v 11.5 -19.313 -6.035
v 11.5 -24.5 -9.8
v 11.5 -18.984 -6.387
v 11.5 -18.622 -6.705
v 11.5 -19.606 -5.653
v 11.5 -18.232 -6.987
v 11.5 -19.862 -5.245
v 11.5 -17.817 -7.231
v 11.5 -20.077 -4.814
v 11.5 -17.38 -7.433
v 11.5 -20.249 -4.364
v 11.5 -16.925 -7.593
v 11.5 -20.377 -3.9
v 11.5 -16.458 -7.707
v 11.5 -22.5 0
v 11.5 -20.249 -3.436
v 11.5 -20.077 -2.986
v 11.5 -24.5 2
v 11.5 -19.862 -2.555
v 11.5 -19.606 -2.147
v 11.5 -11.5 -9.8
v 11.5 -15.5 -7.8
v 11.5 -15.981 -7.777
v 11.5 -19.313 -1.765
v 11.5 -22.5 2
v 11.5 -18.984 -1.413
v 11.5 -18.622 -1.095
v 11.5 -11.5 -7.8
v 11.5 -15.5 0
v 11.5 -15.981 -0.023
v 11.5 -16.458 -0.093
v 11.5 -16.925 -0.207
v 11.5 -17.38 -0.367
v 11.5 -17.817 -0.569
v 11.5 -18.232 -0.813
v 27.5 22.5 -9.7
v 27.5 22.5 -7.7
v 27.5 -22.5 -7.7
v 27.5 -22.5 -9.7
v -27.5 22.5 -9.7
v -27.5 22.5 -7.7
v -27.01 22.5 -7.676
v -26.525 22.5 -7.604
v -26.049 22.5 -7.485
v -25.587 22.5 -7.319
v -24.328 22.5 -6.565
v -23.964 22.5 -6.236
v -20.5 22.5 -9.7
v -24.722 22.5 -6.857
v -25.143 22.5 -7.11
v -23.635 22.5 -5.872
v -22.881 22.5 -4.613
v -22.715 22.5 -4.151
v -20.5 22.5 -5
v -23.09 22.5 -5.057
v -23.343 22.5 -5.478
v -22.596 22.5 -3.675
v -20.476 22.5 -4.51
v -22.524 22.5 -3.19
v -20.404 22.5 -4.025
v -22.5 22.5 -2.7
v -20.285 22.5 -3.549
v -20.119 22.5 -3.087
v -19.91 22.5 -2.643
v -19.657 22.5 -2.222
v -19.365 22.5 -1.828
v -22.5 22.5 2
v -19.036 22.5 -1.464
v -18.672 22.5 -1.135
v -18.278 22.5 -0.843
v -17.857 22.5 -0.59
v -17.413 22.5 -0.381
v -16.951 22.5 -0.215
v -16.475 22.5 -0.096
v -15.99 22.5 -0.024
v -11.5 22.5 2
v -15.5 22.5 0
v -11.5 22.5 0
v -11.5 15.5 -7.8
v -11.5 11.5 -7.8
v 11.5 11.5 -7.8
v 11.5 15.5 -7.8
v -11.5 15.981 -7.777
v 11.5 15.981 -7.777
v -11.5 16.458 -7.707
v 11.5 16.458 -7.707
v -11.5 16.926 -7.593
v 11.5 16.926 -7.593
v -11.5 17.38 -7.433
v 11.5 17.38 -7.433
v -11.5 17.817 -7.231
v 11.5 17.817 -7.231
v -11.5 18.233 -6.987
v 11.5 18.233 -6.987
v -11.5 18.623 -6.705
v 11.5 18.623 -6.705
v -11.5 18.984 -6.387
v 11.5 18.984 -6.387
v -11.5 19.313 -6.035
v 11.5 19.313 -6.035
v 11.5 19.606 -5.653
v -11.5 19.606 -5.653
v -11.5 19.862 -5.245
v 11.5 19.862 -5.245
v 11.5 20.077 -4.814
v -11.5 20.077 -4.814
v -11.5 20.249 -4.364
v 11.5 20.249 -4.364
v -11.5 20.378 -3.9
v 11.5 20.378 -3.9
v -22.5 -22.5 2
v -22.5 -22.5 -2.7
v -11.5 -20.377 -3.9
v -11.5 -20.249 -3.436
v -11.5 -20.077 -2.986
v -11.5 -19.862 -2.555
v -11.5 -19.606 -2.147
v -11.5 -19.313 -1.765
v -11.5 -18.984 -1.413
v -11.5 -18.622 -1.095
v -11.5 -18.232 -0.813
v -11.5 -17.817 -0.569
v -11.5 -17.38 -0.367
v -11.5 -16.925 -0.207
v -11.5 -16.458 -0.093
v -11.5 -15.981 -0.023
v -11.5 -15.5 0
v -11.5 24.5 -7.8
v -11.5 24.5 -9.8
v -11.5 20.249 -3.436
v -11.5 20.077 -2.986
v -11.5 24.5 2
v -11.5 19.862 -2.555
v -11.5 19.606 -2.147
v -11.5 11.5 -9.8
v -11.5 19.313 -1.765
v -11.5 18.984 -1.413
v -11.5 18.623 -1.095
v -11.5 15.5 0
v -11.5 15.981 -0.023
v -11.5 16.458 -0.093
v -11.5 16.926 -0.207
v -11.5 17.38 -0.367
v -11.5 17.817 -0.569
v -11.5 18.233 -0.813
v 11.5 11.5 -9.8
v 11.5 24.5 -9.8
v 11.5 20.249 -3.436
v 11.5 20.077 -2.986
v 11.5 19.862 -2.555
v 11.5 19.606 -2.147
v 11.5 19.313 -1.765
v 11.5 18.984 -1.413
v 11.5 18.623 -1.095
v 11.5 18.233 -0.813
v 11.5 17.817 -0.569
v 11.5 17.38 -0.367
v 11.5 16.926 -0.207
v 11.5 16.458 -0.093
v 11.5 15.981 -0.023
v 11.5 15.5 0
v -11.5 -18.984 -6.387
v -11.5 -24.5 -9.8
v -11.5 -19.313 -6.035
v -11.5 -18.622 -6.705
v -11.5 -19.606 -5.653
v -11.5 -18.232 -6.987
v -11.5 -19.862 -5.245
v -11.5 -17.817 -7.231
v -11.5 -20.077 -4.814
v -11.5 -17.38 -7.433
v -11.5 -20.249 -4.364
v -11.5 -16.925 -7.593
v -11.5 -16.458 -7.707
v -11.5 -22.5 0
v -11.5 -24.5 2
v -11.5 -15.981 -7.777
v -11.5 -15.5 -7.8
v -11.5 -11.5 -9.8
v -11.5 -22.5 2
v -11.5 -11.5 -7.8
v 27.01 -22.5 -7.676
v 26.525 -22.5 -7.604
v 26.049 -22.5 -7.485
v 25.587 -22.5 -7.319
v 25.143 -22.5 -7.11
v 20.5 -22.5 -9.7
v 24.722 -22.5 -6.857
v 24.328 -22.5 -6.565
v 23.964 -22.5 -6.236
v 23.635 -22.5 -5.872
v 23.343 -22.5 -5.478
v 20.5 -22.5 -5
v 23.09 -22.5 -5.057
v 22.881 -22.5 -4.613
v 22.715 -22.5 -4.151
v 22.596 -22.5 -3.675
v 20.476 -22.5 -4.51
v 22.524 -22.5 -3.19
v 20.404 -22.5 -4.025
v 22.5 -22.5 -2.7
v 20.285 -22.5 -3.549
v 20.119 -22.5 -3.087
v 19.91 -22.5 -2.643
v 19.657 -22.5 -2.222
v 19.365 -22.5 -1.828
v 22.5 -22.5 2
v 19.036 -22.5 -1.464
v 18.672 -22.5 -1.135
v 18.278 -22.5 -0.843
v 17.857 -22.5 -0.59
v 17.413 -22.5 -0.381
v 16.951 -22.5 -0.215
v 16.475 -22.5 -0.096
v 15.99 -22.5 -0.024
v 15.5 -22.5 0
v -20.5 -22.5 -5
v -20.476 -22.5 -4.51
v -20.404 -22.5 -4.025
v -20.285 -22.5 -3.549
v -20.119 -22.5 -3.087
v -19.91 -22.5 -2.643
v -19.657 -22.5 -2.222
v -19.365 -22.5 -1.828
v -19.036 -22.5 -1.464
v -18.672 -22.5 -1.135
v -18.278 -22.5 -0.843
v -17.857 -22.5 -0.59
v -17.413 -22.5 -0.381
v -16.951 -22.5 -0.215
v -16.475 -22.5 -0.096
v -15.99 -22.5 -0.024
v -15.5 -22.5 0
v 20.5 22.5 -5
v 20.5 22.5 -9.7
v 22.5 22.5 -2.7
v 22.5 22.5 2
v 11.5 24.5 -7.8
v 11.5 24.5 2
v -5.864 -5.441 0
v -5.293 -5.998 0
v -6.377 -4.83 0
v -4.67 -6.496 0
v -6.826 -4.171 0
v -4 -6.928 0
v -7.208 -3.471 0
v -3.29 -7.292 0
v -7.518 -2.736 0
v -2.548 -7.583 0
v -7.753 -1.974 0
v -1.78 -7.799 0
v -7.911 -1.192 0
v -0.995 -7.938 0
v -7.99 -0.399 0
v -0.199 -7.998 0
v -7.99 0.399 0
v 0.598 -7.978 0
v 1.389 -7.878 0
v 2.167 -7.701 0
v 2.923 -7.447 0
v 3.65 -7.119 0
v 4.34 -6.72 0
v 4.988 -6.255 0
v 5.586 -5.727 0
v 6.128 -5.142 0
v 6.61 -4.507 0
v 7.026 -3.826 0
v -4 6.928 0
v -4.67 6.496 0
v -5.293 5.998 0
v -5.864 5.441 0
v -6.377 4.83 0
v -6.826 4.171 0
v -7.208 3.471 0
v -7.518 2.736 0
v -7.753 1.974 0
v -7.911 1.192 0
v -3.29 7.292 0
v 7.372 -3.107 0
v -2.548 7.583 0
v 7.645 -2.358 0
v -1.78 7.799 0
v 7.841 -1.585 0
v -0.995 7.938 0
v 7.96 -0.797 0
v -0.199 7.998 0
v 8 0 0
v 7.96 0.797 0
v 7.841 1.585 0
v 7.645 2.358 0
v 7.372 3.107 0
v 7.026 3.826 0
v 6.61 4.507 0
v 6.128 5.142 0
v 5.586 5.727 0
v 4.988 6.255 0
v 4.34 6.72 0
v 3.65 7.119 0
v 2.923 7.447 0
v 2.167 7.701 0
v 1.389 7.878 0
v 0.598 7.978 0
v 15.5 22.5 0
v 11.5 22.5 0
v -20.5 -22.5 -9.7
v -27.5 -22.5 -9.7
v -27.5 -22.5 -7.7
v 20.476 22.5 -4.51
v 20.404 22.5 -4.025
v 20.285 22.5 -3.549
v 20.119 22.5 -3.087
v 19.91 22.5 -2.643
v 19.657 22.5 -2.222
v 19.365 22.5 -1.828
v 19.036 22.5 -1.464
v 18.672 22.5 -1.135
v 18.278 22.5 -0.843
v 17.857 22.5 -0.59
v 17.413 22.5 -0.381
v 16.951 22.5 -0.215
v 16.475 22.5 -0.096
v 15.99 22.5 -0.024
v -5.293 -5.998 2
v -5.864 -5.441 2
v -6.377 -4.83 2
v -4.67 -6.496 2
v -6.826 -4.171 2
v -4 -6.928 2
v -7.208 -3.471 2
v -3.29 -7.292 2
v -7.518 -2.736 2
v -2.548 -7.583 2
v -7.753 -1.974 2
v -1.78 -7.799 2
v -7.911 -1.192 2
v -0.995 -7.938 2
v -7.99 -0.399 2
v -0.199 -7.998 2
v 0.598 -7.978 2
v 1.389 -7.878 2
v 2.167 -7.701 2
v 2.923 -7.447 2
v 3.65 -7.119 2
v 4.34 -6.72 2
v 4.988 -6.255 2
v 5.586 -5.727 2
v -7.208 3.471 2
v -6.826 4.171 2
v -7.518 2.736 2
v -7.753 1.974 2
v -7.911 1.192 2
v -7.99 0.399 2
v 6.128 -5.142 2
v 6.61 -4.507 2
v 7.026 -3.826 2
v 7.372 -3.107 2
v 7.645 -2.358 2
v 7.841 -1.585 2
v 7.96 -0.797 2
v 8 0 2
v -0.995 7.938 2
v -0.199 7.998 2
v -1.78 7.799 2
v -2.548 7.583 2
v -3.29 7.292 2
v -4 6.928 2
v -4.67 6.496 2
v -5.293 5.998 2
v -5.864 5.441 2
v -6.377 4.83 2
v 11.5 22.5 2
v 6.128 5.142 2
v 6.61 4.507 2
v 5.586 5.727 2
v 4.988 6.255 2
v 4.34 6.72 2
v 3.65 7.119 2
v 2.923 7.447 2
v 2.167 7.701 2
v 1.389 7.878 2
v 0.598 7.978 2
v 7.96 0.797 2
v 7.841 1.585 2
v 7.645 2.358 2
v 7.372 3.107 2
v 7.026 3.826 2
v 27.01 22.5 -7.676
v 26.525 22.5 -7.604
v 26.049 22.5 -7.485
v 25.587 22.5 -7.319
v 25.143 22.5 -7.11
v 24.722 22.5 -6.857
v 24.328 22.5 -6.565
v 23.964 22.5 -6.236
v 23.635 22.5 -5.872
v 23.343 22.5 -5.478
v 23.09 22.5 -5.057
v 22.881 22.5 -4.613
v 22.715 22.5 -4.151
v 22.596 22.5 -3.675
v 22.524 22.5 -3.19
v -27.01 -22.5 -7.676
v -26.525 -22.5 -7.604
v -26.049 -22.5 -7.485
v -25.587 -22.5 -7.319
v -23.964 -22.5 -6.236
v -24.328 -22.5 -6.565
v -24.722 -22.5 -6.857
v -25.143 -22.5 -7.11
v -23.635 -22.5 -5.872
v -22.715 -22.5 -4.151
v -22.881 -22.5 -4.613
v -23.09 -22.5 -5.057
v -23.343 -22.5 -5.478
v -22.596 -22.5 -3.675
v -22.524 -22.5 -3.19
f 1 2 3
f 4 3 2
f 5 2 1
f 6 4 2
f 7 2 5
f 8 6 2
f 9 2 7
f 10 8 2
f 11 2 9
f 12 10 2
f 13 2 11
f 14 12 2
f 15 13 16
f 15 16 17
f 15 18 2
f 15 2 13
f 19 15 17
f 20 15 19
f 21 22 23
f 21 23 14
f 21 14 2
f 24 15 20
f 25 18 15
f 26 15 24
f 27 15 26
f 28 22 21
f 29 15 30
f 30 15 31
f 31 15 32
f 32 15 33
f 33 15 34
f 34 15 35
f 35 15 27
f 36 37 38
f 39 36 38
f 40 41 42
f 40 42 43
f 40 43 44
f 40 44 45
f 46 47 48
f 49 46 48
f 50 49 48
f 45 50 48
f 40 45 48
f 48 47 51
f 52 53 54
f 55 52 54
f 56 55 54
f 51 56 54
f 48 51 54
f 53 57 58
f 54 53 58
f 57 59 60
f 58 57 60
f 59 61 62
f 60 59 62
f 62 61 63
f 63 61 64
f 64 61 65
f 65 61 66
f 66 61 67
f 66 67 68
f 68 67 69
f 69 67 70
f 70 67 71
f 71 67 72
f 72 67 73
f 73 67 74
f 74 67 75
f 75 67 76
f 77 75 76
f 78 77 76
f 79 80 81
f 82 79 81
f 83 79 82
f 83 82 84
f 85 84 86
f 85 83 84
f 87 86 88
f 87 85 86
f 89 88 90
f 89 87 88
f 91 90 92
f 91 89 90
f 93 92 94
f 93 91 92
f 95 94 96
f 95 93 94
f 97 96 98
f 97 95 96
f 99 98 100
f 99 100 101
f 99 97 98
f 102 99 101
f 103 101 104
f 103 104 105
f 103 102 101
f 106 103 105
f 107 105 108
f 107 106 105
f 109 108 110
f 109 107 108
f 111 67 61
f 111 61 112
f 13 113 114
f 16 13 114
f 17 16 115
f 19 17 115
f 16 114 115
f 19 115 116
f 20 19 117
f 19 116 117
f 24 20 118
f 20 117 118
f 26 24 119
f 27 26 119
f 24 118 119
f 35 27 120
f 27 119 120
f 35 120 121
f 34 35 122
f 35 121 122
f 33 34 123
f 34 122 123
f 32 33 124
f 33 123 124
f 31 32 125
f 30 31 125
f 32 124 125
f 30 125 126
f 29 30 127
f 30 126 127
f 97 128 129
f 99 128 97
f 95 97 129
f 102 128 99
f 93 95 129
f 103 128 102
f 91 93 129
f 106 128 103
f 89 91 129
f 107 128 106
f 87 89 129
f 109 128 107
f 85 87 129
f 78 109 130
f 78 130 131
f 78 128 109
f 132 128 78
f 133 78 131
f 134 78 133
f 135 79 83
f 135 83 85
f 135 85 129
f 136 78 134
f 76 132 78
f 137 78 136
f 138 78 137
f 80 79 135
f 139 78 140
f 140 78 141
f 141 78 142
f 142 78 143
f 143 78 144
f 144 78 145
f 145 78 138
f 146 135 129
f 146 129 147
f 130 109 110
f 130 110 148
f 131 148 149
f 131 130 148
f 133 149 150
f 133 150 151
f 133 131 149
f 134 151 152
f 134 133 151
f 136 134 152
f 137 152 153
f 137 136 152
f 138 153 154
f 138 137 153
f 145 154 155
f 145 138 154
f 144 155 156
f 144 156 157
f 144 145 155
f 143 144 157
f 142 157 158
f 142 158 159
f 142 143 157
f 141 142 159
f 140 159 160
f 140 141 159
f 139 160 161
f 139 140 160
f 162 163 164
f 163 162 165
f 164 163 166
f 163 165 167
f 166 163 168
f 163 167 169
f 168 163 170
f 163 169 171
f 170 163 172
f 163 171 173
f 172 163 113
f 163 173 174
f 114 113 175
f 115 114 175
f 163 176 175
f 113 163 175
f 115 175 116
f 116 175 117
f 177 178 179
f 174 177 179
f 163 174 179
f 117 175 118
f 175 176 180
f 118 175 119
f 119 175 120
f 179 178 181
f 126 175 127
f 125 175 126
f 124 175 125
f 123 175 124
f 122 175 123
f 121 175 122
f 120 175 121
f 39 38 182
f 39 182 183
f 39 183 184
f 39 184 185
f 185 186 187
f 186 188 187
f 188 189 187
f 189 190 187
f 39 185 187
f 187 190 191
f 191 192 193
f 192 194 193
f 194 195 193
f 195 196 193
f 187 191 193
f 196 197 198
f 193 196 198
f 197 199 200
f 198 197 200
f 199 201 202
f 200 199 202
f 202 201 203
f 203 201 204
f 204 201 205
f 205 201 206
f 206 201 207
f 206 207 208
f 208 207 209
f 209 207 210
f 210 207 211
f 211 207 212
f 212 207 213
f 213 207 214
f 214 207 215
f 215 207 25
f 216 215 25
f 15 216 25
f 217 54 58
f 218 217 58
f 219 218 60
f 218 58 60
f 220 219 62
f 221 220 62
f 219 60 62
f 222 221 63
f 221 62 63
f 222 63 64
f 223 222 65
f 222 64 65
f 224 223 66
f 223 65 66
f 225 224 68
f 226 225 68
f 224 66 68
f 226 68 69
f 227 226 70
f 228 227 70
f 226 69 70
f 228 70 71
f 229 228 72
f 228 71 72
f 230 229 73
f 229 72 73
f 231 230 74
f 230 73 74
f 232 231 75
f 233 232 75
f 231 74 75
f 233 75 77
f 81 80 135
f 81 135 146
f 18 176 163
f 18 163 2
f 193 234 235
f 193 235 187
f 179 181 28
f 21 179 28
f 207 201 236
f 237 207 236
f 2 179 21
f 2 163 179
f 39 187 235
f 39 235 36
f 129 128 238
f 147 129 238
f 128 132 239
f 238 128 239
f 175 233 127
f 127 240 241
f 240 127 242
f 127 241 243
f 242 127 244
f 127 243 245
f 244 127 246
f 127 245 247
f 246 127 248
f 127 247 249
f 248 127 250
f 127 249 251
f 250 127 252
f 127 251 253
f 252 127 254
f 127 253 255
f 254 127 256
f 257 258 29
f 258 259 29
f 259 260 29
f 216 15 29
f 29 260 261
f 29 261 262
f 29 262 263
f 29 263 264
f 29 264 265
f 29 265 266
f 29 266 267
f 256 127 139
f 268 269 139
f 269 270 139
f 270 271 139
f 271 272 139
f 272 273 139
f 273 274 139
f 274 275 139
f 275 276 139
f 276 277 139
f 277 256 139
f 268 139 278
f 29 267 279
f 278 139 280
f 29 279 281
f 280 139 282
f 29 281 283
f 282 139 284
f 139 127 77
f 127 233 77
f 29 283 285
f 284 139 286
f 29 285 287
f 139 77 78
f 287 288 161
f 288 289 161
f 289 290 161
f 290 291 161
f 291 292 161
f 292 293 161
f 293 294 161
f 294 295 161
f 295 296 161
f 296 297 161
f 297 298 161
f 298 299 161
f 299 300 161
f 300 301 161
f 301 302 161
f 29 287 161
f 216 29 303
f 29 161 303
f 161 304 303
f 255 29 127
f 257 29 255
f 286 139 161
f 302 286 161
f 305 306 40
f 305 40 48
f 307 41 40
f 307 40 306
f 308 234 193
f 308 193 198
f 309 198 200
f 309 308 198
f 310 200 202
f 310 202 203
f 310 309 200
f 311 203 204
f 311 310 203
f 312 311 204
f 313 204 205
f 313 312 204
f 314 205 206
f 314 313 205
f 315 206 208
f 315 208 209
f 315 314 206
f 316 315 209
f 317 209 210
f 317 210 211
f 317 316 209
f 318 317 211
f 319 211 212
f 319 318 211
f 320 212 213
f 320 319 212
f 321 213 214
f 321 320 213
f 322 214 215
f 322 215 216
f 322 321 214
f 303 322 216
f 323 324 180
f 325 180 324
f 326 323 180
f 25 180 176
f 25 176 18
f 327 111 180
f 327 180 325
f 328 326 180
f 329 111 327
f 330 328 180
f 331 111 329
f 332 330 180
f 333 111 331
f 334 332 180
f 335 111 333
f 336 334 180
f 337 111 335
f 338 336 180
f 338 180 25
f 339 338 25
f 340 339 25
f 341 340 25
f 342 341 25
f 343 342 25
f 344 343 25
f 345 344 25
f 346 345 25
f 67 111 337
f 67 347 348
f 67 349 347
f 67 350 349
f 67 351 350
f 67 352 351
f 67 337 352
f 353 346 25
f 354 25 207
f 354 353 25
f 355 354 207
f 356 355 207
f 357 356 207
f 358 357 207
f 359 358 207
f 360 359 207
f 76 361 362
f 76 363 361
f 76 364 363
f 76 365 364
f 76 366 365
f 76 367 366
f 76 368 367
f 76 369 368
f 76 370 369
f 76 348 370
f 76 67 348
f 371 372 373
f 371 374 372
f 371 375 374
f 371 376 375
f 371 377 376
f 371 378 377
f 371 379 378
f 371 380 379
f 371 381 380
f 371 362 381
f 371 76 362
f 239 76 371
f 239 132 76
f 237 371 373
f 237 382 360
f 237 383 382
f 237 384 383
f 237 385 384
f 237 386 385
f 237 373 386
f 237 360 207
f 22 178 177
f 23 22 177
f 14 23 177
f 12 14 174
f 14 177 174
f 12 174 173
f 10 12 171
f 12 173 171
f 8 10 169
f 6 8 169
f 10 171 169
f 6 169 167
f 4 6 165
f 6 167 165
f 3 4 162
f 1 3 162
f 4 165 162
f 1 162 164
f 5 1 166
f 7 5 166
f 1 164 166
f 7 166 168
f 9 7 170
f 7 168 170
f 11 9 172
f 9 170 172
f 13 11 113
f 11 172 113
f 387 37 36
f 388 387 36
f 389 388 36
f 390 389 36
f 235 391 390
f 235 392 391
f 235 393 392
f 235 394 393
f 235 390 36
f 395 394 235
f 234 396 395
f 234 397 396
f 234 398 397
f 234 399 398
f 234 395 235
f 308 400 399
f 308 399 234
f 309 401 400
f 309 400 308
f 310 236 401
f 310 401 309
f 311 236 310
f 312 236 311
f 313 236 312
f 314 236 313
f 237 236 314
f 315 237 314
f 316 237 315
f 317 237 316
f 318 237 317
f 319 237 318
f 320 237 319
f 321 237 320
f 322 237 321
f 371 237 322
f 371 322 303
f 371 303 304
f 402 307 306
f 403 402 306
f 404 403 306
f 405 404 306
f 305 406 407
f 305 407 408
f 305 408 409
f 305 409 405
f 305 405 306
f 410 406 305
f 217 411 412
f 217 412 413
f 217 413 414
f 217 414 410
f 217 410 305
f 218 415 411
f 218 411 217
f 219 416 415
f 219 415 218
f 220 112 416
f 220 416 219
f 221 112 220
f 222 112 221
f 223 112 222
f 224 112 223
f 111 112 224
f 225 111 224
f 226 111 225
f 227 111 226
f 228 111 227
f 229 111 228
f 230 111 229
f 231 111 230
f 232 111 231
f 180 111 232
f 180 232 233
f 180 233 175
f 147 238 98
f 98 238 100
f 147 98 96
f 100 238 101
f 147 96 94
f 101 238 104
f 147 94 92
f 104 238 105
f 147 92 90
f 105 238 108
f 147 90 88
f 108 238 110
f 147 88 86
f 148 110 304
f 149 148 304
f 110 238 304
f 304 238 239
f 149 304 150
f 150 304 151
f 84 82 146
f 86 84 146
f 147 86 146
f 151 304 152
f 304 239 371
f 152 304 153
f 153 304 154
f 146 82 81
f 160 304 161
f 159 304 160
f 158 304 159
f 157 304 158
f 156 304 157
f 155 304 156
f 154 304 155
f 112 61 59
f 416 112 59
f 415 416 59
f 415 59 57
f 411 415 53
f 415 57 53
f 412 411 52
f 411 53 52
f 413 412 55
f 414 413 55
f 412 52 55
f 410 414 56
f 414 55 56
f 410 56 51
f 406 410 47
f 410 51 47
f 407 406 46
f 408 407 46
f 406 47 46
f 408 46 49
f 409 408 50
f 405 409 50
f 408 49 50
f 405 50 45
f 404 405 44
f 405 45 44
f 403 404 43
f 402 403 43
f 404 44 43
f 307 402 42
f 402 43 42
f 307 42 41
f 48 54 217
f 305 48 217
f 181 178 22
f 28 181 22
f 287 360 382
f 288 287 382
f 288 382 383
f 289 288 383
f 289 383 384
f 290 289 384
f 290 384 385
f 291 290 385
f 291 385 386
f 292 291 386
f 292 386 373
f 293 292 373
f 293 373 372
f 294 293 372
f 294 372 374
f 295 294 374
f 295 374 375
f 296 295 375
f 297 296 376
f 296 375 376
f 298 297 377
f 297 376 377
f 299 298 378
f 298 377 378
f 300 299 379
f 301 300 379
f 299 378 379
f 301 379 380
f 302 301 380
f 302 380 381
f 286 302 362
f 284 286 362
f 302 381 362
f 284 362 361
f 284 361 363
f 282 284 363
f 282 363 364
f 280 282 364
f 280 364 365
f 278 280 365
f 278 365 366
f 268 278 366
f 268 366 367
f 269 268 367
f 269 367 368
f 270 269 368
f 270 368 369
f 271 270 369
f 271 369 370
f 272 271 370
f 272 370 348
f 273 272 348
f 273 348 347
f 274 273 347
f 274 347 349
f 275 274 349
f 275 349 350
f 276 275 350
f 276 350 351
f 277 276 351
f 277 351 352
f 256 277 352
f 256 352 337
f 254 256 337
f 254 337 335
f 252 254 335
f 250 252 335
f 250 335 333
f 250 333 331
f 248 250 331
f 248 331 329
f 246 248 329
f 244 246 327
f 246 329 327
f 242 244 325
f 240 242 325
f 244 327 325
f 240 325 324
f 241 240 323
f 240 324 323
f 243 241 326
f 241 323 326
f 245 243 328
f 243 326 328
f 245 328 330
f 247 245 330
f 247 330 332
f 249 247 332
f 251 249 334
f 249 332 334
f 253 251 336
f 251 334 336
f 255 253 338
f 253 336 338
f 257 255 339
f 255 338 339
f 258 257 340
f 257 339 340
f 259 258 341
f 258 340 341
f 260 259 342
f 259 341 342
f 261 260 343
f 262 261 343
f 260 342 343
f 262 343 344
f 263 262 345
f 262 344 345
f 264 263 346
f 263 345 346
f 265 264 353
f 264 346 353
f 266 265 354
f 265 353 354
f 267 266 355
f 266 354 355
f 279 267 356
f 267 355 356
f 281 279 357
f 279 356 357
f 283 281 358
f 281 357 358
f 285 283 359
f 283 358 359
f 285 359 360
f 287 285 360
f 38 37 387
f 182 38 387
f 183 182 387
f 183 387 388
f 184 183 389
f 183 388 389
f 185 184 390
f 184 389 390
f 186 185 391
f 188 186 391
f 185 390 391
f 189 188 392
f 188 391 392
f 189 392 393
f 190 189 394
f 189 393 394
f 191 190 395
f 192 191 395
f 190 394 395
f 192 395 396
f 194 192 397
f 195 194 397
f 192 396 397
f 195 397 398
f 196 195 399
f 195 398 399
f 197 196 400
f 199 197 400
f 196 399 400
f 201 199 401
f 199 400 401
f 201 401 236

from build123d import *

# Parameters (mm, degrees)
F0_W         = 45
F0_H         = 45
F1_DEPTH     = 2
F2_R         = 8
F3_DEPTH     = 25
F4_W         = 23
F4_H         = 3.9995294809
F4_H_2       = 4
F5_DEPTH     = 9.8
F6_W         = 23
F6_H         = 9
F6_H_2       = 4
F7_DEPTH     = 2
F8_W         = 23
F8_H         = 13
F9_DEPTH     = 2
F10_W        = 2
F10_H        = 45
F11_DEPTH    = 7.7
F12_W        = 7
F12_H        = 45
F13_W        = 7
F13_H        = 45
F14_DEPTH    = 2
F15_T1_DEPTH = 23
F15_T3_DEPTH = 45


# Not quite as in the source:
# - a fillet or chamfer that OpenCascade refuses, or shapes differently, is made with other operations: its cross-section is extruded or revolved along the edge and cut away or added


with BuildPart() as f1:
    # F0 (on Top) → F1 (new body)
    with BuildSketch(Plane.XY):
        Rectangle(F0_W, F0_H)
    extrude(amount=F1_DEPTH)

    # F2 (on face) → F3 (cut)
    with BuildSketch(Plane.XY.offset(2)):
        Circle(F2_R)
    extrude(amount=-F3_DEPTH, mode=Mode.SUBTRACT)

    # F4 (on face) → F5 (join)
    with BuildSketch(Plane.XY.offset(2)):
        with Locations((0, 22.5)):
            Rectangle(F4_W, F4_H)
        with Locations((0, -22.5)):
            Rectangle(F4_W, F4_H_2)
    extrude(amount=-F5_DEPTH)

    # F6 (on face) → F7 (join)
    with BuildSketch(Plane(origin=(0, 0, -7.8), x_dir=(1, 0, 0), z_dir=(0, 0, -1))):
        with Locations((0, 16)):
            Rectangle(F6_W, F6_H)
        with Locations((0, 22.5)):
            Rectangle(F6_W, F6_H_2)
    extrude(amount=F7_DEPTH)

    # F8 (on face) → F9 (join)
    with BuildSketch(Plane(origin=(0, 0, -7.8), x_dir=(1, 0, 0), z_dir=(0, 0, -1))):
        with Locations((0, -17.9997647405)):
            Rectangle(F8_W, F8_H)
    extrude(amount=F9_DEPTH)

    # F10 (on face) → F11 (join)
    with BuildSketch(Plane(origin=(0, 0, 0), x_dir=(1, 0, 0), z_dir=(0, 0, -1))):
        with Locations((-21.5, 0)):
            Rectangle(F10_W, F10_H)
        with Locations((21.5, 0)):
            Rectangle(F10_W, F10_H)
    extrude(amount=F11_DEPTH)

    # F12 (on face) + F13 (on face) → F14 (join)
    with BuildSketch(Plane(origin=(0, 0, -7.7), x_dir=(1, 0, 0), z_dir=(0, 0, -1))):
        with Locations((-24, 0)):
            Rectangle(F12_W, F12_H)
    with BuildSketch(Plane(origin=(0, 0, -7.7), x_dir=(1, 0, 0), z_dir=(0, 0, -1))):
        with Locations((24, 0)):
            Rectangle(F13_W, F13_H)
    extrude(amount=F14_DEPTH)

    # F15: fillet of radius 5 on 8 edges, made by hand

    # F15_s2 → F15_t1 (join)
    with BuildSketch(Plane.YZ.offset(-11.5)):
        with BuildLine():
            ThreePointArc((-15.5, -7.8), (-19.0355339059, -6.3355339059), (-20.5, -2.8))
            Line((-20.5, -2.8), (-20.5, -7.8))
            Line((-20.5, -7.8), (-15.5, -7.8))
        make_face()
        with BuildLine():
            ThreePointArc((15.5002352595, -7.8), (19.0357691655, -6.3355339059), (20.5002352595, -2.8))
            Line((20.5002352595, -2.8), (20.5002352595, -7.8))
            Line((20.5002352595, -7.8), (15.5002352595, -7.8))
        make_face()
        with BuildLine():
            ThreePointArc((20.5002352595, -5), (19.0357691655, -1.4644660941), (15.5002352595, 0))
            Line((15.5002352595, 0), (20.5002352595, 0))
            Line((20.5002352595, 0), (20.5002352595, -5))
        make_face()
        with BuildLine():
            ThreePointArc((-20.5, -5), (-19.0355339059, -1.4644660941), (-15.5, 0))
            Line((-15.5, 0), (-20.5, 0))
            Line((-20.5, 0), (-20.5, -5))
        make_face()
    extrude(amount=F15_T1_DEPTH)

    # F15_s4 → F15_t3 (join)
    with BuildSketch(Plane.XZ.offset(-22.5)):
        with BuildLine():
            ThreePointArc((20.5, -5), (19.0355339059, -1.4644660941), (15.5, 0))
            Line((15.5, 0), (20.5, 0))
            Line((20.5, 0), (20.5, -5))
        make_face()
        with BuildLine():
            ThreePointArc((-20.5, -5), (-19.0355339059, -1.4644660941), (-15.5, 0))
            Line((-15.5, 0), (-20.5, 0))
            Line((-20.5, 0), (-20.5, -5))
        make_face()
        with BuildLine():
            ThreePointArc((-22.5, -2.7), (-23.9644660941, -6.2355339059), (-27.5, -7.7))
            Line((-27.5, -7.7), (-22.5, -7.7))
            Line((-22.5, -7.7), (-22.5, -2.7))
        make_face()
        with BuildLine():
            ThreePointArc((27.5, -7.7), (23.9644660941, -6.2355339059), (22.5, -2.7))
            Line((22.5, -2.7), (22.5, -7.7))
            Line((22.5, -7.7), (27.5, -7.7))
        make_face()
    extrude(amount=F15_T3_DEPTH)


solid = f1.part
